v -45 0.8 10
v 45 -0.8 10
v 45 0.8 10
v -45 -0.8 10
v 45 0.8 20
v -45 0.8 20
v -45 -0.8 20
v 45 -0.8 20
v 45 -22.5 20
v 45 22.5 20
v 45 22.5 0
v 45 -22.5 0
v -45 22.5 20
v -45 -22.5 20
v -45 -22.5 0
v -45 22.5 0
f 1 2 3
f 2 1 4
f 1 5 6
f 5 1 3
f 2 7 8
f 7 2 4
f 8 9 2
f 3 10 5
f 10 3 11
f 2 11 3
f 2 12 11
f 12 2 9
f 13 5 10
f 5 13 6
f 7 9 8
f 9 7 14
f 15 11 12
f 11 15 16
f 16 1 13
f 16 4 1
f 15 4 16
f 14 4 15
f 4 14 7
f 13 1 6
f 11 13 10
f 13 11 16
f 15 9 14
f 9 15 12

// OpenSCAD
// Slide drying rack - holds 10 microscope slides standing upright on their long edge
// Print orientation: base block on the bed (z = 0), slots open upward (+Z)

// ---------------- Parameters ----------------
block_len    = 90;    // base block length along X (mm)
block_wid    = 45;    // base block width along Y (mm)
block_h      = 20;    // base block height along Z (mm)

slot_count   = 10;    // number of slide slots
slot_len     = 77;    // slot length along X (mm)
slot_w       = 1.6;   // slot width along Y (mm)
slot_depth   = 10;    // slot depth from top face (mm)
slot_pitch   = 3.5;   // centre-to-centre slot spacing along Y (mm)

eps          = 0.5;   // overshoot of cutters past the top face (mm)

$fn = 64;

// ---------------- Model ----------------
difference() {
    // Base block, centred in X and Y, sitting on z = 0
    translate([-block_len / 2, -block_wid / 2, 0])
        cube([block_len, block_wid, block_h]);

    // Parallel slots, centred as a group in X and Y
    for (i = [0 : slot_count - 1]) {
        x = (i - (slot_count - 1) / 2) * slot_pitch;
        translate([x - slot_len / 2, -slot_w / 2, block_h - slot_depth])
            cube([slot_len, slot_w, slot_depth + eps]);
    }
}
